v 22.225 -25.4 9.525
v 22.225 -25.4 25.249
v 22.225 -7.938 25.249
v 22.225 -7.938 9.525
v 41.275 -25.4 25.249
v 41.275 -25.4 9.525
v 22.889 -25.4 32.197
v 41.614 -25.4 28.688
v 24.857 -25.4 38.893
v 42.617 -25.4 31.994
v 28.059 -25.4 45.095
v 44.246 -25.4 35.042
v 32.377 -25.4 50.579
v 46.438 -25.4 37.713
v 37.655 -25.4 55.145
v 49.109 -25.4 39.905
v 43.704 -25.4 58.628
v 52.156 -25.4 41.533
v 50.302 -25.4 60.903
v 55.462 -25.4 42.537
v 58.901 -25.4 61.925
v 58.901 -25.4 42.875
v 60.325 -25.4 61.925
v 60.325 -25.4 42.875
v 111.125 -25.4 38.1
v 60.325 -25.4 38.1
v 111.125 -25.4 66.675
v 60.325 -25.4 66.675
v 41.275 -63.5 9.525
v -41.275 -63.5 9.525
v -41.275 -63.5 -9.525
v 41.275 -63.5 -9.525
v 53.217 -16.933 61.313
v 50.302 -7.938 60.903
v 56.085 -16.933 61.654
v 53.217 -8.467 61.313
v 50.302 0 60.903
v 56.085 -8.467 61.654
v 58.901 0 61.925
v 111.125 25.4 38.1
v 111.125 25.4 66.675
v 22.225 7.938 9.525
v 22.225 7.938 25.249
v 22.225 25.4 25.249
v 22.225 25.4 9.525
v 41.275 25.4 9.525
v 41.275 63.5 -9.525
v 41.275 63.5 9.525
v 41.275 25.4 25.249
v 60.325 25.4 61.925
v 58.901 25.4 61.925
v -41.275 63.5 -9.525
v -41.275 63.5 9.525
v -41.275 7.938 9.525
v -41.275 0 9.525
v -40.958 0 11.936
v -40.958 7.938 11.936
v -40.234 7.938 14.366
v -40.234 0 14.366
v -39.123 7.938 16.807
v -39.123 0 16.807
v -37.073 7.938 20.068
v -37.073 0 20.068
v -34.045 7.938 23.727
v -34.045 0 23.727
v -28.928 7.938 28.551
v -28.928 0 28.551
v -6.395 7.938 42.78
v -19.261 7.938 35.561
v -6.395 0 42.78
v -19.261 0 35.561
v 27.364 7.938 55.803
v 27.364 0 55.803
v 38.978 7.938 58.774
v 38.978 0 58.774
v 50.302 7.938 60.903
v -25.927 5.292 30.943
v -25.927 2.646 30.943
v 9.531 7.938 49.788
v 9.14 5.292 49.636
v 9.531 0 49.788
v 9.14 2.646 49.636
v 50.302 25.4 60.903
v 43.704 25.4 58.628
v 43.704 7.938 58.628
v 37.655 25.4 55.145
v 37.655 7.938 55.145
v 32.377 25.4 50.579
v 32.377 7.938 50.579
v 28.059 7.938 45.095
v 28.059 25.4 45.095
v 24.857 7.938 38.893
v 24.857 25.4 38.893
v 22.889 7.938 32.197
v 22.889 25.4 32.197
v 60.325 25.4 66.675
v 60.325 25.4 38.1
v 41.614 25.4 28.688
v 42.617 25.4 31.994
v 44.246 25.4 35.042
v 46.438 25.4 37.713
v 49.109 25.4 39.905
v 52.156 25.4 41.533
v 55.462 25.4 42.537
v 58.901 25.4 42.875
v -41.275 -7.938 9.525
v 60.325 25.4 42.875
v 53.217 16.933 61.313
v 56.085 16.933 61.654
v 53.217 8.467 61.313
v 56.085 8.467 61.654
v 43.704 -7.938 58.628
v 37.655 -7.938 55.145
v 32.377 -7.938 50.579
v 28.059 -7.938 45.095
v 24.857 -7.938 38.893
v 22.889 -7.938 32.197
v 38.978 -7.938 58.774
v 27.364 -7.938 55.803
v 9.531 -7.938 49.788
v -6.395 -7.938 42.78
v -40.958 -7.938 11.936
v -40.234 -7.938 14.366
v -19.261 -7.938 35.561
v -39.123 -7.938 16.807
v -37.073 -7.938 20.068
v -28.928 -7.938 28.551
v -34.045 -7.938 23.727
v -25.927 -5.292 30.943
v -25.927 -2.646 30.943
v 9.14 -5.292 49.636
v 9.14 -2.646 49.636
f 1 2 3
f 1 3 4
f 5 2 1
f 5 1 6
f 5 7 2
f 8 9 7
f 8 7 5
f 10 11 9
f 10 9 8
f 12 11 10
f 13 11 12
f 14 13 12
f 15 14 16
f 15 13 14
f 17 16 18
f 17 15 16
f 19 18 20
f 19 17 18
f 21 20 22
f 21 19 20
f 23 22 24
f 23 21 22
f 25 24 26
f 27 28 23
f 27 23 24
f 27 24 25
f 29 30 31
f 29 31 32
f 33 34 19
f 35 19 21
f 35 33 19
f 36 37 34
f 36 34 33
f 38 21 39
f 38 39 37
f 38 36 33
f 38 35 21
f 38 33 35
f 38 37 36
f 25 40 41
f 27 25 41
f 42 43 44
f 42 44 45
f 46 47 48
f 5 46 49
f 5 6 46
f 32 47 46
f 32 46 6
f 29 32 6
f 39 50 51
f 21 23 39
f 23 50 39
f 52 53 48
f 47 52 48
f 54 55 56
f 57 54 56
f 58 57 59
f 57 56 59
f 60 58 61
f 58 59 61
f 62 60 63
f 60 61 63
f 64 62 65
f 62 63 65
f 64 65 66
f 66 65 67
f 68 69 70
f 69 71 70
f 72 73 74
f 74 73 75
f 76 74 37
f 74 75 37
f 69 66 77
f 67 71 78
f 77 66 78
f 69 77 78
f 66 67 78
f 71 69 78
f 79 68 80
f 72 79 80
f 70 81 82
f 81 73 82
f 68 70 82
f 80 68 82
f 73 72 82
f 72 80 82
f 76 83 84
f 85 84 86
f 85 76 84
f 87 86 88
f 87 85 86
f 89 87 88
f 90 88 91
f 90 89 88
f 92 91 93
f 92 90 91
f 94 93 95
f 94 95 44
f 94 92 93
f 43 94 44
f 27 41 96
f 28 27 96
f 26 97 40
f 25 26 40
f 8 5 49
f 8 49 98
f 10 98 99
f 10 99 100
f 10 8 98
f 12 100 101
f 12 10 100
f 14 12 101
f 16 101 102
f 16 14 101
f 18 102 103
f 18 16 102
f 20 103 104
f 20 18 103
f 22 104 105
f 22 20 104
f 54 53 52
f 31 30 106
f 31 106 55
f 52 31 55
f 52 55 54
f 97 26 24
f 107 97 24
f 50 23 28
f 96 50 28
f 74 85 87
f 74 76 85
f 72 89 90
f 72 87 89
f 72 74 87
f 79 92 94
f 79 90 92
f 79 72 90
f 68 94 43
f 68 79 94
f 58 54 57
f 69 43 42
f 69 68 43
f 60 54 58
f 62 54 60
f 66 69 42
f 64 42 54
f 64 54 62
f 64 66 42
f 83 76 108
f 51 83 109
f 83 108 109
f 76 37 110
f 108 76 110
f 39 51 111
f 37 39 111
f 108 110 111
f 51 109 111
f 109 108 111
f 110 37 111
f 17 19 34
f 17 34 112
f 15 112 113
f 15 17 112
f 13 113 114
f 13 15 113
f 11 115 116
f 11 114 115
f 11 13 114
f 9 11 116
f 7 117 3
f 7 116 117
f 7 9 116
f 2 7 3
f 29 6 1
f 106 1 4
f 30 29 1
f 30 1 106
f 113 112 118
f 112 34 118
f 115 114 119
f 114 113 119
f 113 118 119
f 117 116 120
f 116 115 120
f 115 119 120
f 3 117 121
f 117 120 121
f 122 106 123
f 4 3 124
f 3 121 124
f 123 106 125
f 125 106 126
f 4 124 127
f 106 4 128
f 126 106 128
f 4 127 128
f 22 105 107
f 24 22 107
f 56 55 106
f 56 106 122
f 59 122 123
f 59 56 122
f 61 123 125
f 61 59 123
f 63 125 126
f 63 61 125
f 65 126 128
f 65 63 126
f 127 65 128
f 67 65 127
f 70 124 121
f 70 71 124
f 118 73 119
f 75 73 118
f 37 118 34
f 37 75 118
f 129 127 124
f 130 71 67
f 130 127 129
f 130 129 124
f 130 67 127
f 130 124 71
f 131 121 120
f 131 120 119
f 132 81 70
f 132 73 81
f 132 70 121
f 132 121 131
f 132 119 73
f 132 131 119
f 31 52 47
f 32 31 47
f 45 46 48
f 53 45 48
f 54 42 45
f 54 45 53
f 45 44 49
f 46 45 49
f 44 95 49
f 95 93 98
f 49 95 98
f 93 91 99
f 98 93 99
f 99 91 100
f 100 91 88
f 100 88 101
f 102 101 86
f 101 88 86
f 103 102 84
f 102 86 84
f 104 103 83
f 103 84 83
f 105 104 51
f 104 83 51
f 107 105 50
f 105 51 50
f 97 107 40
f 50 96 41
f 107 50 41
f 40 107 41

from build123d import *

# Parameters (mm, degrees)
F1_DEPTH = 63.5
F0_W     = 25.4
F0_H     = 19.05
F0_H_2   = 4.7752
F0_H_3   = 4.7498
F2_DEPTH = 25.4
F3_DEPTH = 7.9375


with BuildPart() as f1:
    # F0 (on Front) → F1 (new body, symmetric)
    with BuildSketch(Plane.XZ):
        Polygon((22.225, 9.525), (-41.275, 9.525), (-41.275, -9.525), (41.275, -9.525), (41.275, 9.525), align=None)
    extrude(amount=F1_DEPTH, both=True)

    # F0 (on Front) → F2 (join, symmetric)
    with BuildSketch(Plane.XZ):
        with BuildLine():
            Line((22.225, 25.2490305709), (22.225, 9.525))
            Line((22.225, 9.525), (41.275, 9.525))
            Line((41.275, 9.525), (41.275, 25.2490305709))
            ThreePointArc((41.275, 25.2490305709), (46.4375854994, 37.7126145006), (58.9011694291, 42.8752))
            Line((58.9011694291, 42.8752), (60.325, 42.8752))
            Line((60.325, 42.8752), (60.325, 61.9252))
            Line((60.325, 61.9252), (58.9011694291, 61.9252))
            add(Edge.make_bspline(
                [(50.3021553642, 60.9028993807), (53.2386856035, 61.3461922801), (56.1133148393, 61.6898187514), (58.9011694291, 61.9252)],
                knots=[105.260953705, 105.260953705, 105.260953705, 105.260953705, 113.0532877962, 113.0532877962, 113.0532877962, 113.0532877962], degree=3))
            ThreePointArc((50.3021553642, 60.9028993807), (30.0869342253, 47.9400255604), (22.225, 25.2490305709))
        make_face()
        with Locations((73.025, 52.4002)):
            Rectangle(F0_W, F0_H)
        with Locations((73.025, 40.4876)):
            Rectangle(F0_W, F0_H_2)
        with Locations((73.025, 64.3001)):
            Rectangle(F0_W, F0_H_3)
        Polygon((85.725, 66.675), (85.725, 61.9252), (85.725, 42.8752), (85.725, 38.1), (111.125, 38.1), (111.125, 66.675), align=None)
    extrude(amount=F2_DEPTH, both=True)

    # F0 (on Front) → F3 (join, symmetric)
    with BuildSketch(Plane.XZ):
        with BuildLine():
            add(Edge.make_bspline(
                [(-41.275, 9.525), (-40.3280161363, 30.740190757), (10.6347117007, 54.914779156), (50.3021553642, 60.9028993807)],
                knots=[0, 0, 0, 0, 105.260953705, 105.260953705, 105.260953705, 105.260953705], degree=3))
            Line((-41.275, 9.525), (22.225, 9.525))
            Line((22.225, 9.525), (22.225, 25.2490305709))
            ThreePointArc((22.225, 25.2490305709), (30.0869342253, 47.9400255604), (50.3021553642, 60.9028993807))
        make_face()
    extrude(amount=F3_DEPTH, both=True)


solid = f1.part
